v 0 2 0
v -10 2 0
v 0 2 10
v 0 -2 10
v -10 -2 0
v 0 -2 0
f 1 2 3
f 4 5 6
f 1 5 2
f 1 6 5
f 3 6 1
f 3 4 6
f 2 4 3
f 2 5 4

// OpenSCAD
b = 10;
h = 10;
w = 4;

//Start with an extruded triangle
rotate(a=[90,-90,0])
	linear_extrude(height = w, center = true, convexity = 10, twist = 0)
		polygon(points=[[0,0],[h,0],[0,b]], paths=[[0,1,2]]);
